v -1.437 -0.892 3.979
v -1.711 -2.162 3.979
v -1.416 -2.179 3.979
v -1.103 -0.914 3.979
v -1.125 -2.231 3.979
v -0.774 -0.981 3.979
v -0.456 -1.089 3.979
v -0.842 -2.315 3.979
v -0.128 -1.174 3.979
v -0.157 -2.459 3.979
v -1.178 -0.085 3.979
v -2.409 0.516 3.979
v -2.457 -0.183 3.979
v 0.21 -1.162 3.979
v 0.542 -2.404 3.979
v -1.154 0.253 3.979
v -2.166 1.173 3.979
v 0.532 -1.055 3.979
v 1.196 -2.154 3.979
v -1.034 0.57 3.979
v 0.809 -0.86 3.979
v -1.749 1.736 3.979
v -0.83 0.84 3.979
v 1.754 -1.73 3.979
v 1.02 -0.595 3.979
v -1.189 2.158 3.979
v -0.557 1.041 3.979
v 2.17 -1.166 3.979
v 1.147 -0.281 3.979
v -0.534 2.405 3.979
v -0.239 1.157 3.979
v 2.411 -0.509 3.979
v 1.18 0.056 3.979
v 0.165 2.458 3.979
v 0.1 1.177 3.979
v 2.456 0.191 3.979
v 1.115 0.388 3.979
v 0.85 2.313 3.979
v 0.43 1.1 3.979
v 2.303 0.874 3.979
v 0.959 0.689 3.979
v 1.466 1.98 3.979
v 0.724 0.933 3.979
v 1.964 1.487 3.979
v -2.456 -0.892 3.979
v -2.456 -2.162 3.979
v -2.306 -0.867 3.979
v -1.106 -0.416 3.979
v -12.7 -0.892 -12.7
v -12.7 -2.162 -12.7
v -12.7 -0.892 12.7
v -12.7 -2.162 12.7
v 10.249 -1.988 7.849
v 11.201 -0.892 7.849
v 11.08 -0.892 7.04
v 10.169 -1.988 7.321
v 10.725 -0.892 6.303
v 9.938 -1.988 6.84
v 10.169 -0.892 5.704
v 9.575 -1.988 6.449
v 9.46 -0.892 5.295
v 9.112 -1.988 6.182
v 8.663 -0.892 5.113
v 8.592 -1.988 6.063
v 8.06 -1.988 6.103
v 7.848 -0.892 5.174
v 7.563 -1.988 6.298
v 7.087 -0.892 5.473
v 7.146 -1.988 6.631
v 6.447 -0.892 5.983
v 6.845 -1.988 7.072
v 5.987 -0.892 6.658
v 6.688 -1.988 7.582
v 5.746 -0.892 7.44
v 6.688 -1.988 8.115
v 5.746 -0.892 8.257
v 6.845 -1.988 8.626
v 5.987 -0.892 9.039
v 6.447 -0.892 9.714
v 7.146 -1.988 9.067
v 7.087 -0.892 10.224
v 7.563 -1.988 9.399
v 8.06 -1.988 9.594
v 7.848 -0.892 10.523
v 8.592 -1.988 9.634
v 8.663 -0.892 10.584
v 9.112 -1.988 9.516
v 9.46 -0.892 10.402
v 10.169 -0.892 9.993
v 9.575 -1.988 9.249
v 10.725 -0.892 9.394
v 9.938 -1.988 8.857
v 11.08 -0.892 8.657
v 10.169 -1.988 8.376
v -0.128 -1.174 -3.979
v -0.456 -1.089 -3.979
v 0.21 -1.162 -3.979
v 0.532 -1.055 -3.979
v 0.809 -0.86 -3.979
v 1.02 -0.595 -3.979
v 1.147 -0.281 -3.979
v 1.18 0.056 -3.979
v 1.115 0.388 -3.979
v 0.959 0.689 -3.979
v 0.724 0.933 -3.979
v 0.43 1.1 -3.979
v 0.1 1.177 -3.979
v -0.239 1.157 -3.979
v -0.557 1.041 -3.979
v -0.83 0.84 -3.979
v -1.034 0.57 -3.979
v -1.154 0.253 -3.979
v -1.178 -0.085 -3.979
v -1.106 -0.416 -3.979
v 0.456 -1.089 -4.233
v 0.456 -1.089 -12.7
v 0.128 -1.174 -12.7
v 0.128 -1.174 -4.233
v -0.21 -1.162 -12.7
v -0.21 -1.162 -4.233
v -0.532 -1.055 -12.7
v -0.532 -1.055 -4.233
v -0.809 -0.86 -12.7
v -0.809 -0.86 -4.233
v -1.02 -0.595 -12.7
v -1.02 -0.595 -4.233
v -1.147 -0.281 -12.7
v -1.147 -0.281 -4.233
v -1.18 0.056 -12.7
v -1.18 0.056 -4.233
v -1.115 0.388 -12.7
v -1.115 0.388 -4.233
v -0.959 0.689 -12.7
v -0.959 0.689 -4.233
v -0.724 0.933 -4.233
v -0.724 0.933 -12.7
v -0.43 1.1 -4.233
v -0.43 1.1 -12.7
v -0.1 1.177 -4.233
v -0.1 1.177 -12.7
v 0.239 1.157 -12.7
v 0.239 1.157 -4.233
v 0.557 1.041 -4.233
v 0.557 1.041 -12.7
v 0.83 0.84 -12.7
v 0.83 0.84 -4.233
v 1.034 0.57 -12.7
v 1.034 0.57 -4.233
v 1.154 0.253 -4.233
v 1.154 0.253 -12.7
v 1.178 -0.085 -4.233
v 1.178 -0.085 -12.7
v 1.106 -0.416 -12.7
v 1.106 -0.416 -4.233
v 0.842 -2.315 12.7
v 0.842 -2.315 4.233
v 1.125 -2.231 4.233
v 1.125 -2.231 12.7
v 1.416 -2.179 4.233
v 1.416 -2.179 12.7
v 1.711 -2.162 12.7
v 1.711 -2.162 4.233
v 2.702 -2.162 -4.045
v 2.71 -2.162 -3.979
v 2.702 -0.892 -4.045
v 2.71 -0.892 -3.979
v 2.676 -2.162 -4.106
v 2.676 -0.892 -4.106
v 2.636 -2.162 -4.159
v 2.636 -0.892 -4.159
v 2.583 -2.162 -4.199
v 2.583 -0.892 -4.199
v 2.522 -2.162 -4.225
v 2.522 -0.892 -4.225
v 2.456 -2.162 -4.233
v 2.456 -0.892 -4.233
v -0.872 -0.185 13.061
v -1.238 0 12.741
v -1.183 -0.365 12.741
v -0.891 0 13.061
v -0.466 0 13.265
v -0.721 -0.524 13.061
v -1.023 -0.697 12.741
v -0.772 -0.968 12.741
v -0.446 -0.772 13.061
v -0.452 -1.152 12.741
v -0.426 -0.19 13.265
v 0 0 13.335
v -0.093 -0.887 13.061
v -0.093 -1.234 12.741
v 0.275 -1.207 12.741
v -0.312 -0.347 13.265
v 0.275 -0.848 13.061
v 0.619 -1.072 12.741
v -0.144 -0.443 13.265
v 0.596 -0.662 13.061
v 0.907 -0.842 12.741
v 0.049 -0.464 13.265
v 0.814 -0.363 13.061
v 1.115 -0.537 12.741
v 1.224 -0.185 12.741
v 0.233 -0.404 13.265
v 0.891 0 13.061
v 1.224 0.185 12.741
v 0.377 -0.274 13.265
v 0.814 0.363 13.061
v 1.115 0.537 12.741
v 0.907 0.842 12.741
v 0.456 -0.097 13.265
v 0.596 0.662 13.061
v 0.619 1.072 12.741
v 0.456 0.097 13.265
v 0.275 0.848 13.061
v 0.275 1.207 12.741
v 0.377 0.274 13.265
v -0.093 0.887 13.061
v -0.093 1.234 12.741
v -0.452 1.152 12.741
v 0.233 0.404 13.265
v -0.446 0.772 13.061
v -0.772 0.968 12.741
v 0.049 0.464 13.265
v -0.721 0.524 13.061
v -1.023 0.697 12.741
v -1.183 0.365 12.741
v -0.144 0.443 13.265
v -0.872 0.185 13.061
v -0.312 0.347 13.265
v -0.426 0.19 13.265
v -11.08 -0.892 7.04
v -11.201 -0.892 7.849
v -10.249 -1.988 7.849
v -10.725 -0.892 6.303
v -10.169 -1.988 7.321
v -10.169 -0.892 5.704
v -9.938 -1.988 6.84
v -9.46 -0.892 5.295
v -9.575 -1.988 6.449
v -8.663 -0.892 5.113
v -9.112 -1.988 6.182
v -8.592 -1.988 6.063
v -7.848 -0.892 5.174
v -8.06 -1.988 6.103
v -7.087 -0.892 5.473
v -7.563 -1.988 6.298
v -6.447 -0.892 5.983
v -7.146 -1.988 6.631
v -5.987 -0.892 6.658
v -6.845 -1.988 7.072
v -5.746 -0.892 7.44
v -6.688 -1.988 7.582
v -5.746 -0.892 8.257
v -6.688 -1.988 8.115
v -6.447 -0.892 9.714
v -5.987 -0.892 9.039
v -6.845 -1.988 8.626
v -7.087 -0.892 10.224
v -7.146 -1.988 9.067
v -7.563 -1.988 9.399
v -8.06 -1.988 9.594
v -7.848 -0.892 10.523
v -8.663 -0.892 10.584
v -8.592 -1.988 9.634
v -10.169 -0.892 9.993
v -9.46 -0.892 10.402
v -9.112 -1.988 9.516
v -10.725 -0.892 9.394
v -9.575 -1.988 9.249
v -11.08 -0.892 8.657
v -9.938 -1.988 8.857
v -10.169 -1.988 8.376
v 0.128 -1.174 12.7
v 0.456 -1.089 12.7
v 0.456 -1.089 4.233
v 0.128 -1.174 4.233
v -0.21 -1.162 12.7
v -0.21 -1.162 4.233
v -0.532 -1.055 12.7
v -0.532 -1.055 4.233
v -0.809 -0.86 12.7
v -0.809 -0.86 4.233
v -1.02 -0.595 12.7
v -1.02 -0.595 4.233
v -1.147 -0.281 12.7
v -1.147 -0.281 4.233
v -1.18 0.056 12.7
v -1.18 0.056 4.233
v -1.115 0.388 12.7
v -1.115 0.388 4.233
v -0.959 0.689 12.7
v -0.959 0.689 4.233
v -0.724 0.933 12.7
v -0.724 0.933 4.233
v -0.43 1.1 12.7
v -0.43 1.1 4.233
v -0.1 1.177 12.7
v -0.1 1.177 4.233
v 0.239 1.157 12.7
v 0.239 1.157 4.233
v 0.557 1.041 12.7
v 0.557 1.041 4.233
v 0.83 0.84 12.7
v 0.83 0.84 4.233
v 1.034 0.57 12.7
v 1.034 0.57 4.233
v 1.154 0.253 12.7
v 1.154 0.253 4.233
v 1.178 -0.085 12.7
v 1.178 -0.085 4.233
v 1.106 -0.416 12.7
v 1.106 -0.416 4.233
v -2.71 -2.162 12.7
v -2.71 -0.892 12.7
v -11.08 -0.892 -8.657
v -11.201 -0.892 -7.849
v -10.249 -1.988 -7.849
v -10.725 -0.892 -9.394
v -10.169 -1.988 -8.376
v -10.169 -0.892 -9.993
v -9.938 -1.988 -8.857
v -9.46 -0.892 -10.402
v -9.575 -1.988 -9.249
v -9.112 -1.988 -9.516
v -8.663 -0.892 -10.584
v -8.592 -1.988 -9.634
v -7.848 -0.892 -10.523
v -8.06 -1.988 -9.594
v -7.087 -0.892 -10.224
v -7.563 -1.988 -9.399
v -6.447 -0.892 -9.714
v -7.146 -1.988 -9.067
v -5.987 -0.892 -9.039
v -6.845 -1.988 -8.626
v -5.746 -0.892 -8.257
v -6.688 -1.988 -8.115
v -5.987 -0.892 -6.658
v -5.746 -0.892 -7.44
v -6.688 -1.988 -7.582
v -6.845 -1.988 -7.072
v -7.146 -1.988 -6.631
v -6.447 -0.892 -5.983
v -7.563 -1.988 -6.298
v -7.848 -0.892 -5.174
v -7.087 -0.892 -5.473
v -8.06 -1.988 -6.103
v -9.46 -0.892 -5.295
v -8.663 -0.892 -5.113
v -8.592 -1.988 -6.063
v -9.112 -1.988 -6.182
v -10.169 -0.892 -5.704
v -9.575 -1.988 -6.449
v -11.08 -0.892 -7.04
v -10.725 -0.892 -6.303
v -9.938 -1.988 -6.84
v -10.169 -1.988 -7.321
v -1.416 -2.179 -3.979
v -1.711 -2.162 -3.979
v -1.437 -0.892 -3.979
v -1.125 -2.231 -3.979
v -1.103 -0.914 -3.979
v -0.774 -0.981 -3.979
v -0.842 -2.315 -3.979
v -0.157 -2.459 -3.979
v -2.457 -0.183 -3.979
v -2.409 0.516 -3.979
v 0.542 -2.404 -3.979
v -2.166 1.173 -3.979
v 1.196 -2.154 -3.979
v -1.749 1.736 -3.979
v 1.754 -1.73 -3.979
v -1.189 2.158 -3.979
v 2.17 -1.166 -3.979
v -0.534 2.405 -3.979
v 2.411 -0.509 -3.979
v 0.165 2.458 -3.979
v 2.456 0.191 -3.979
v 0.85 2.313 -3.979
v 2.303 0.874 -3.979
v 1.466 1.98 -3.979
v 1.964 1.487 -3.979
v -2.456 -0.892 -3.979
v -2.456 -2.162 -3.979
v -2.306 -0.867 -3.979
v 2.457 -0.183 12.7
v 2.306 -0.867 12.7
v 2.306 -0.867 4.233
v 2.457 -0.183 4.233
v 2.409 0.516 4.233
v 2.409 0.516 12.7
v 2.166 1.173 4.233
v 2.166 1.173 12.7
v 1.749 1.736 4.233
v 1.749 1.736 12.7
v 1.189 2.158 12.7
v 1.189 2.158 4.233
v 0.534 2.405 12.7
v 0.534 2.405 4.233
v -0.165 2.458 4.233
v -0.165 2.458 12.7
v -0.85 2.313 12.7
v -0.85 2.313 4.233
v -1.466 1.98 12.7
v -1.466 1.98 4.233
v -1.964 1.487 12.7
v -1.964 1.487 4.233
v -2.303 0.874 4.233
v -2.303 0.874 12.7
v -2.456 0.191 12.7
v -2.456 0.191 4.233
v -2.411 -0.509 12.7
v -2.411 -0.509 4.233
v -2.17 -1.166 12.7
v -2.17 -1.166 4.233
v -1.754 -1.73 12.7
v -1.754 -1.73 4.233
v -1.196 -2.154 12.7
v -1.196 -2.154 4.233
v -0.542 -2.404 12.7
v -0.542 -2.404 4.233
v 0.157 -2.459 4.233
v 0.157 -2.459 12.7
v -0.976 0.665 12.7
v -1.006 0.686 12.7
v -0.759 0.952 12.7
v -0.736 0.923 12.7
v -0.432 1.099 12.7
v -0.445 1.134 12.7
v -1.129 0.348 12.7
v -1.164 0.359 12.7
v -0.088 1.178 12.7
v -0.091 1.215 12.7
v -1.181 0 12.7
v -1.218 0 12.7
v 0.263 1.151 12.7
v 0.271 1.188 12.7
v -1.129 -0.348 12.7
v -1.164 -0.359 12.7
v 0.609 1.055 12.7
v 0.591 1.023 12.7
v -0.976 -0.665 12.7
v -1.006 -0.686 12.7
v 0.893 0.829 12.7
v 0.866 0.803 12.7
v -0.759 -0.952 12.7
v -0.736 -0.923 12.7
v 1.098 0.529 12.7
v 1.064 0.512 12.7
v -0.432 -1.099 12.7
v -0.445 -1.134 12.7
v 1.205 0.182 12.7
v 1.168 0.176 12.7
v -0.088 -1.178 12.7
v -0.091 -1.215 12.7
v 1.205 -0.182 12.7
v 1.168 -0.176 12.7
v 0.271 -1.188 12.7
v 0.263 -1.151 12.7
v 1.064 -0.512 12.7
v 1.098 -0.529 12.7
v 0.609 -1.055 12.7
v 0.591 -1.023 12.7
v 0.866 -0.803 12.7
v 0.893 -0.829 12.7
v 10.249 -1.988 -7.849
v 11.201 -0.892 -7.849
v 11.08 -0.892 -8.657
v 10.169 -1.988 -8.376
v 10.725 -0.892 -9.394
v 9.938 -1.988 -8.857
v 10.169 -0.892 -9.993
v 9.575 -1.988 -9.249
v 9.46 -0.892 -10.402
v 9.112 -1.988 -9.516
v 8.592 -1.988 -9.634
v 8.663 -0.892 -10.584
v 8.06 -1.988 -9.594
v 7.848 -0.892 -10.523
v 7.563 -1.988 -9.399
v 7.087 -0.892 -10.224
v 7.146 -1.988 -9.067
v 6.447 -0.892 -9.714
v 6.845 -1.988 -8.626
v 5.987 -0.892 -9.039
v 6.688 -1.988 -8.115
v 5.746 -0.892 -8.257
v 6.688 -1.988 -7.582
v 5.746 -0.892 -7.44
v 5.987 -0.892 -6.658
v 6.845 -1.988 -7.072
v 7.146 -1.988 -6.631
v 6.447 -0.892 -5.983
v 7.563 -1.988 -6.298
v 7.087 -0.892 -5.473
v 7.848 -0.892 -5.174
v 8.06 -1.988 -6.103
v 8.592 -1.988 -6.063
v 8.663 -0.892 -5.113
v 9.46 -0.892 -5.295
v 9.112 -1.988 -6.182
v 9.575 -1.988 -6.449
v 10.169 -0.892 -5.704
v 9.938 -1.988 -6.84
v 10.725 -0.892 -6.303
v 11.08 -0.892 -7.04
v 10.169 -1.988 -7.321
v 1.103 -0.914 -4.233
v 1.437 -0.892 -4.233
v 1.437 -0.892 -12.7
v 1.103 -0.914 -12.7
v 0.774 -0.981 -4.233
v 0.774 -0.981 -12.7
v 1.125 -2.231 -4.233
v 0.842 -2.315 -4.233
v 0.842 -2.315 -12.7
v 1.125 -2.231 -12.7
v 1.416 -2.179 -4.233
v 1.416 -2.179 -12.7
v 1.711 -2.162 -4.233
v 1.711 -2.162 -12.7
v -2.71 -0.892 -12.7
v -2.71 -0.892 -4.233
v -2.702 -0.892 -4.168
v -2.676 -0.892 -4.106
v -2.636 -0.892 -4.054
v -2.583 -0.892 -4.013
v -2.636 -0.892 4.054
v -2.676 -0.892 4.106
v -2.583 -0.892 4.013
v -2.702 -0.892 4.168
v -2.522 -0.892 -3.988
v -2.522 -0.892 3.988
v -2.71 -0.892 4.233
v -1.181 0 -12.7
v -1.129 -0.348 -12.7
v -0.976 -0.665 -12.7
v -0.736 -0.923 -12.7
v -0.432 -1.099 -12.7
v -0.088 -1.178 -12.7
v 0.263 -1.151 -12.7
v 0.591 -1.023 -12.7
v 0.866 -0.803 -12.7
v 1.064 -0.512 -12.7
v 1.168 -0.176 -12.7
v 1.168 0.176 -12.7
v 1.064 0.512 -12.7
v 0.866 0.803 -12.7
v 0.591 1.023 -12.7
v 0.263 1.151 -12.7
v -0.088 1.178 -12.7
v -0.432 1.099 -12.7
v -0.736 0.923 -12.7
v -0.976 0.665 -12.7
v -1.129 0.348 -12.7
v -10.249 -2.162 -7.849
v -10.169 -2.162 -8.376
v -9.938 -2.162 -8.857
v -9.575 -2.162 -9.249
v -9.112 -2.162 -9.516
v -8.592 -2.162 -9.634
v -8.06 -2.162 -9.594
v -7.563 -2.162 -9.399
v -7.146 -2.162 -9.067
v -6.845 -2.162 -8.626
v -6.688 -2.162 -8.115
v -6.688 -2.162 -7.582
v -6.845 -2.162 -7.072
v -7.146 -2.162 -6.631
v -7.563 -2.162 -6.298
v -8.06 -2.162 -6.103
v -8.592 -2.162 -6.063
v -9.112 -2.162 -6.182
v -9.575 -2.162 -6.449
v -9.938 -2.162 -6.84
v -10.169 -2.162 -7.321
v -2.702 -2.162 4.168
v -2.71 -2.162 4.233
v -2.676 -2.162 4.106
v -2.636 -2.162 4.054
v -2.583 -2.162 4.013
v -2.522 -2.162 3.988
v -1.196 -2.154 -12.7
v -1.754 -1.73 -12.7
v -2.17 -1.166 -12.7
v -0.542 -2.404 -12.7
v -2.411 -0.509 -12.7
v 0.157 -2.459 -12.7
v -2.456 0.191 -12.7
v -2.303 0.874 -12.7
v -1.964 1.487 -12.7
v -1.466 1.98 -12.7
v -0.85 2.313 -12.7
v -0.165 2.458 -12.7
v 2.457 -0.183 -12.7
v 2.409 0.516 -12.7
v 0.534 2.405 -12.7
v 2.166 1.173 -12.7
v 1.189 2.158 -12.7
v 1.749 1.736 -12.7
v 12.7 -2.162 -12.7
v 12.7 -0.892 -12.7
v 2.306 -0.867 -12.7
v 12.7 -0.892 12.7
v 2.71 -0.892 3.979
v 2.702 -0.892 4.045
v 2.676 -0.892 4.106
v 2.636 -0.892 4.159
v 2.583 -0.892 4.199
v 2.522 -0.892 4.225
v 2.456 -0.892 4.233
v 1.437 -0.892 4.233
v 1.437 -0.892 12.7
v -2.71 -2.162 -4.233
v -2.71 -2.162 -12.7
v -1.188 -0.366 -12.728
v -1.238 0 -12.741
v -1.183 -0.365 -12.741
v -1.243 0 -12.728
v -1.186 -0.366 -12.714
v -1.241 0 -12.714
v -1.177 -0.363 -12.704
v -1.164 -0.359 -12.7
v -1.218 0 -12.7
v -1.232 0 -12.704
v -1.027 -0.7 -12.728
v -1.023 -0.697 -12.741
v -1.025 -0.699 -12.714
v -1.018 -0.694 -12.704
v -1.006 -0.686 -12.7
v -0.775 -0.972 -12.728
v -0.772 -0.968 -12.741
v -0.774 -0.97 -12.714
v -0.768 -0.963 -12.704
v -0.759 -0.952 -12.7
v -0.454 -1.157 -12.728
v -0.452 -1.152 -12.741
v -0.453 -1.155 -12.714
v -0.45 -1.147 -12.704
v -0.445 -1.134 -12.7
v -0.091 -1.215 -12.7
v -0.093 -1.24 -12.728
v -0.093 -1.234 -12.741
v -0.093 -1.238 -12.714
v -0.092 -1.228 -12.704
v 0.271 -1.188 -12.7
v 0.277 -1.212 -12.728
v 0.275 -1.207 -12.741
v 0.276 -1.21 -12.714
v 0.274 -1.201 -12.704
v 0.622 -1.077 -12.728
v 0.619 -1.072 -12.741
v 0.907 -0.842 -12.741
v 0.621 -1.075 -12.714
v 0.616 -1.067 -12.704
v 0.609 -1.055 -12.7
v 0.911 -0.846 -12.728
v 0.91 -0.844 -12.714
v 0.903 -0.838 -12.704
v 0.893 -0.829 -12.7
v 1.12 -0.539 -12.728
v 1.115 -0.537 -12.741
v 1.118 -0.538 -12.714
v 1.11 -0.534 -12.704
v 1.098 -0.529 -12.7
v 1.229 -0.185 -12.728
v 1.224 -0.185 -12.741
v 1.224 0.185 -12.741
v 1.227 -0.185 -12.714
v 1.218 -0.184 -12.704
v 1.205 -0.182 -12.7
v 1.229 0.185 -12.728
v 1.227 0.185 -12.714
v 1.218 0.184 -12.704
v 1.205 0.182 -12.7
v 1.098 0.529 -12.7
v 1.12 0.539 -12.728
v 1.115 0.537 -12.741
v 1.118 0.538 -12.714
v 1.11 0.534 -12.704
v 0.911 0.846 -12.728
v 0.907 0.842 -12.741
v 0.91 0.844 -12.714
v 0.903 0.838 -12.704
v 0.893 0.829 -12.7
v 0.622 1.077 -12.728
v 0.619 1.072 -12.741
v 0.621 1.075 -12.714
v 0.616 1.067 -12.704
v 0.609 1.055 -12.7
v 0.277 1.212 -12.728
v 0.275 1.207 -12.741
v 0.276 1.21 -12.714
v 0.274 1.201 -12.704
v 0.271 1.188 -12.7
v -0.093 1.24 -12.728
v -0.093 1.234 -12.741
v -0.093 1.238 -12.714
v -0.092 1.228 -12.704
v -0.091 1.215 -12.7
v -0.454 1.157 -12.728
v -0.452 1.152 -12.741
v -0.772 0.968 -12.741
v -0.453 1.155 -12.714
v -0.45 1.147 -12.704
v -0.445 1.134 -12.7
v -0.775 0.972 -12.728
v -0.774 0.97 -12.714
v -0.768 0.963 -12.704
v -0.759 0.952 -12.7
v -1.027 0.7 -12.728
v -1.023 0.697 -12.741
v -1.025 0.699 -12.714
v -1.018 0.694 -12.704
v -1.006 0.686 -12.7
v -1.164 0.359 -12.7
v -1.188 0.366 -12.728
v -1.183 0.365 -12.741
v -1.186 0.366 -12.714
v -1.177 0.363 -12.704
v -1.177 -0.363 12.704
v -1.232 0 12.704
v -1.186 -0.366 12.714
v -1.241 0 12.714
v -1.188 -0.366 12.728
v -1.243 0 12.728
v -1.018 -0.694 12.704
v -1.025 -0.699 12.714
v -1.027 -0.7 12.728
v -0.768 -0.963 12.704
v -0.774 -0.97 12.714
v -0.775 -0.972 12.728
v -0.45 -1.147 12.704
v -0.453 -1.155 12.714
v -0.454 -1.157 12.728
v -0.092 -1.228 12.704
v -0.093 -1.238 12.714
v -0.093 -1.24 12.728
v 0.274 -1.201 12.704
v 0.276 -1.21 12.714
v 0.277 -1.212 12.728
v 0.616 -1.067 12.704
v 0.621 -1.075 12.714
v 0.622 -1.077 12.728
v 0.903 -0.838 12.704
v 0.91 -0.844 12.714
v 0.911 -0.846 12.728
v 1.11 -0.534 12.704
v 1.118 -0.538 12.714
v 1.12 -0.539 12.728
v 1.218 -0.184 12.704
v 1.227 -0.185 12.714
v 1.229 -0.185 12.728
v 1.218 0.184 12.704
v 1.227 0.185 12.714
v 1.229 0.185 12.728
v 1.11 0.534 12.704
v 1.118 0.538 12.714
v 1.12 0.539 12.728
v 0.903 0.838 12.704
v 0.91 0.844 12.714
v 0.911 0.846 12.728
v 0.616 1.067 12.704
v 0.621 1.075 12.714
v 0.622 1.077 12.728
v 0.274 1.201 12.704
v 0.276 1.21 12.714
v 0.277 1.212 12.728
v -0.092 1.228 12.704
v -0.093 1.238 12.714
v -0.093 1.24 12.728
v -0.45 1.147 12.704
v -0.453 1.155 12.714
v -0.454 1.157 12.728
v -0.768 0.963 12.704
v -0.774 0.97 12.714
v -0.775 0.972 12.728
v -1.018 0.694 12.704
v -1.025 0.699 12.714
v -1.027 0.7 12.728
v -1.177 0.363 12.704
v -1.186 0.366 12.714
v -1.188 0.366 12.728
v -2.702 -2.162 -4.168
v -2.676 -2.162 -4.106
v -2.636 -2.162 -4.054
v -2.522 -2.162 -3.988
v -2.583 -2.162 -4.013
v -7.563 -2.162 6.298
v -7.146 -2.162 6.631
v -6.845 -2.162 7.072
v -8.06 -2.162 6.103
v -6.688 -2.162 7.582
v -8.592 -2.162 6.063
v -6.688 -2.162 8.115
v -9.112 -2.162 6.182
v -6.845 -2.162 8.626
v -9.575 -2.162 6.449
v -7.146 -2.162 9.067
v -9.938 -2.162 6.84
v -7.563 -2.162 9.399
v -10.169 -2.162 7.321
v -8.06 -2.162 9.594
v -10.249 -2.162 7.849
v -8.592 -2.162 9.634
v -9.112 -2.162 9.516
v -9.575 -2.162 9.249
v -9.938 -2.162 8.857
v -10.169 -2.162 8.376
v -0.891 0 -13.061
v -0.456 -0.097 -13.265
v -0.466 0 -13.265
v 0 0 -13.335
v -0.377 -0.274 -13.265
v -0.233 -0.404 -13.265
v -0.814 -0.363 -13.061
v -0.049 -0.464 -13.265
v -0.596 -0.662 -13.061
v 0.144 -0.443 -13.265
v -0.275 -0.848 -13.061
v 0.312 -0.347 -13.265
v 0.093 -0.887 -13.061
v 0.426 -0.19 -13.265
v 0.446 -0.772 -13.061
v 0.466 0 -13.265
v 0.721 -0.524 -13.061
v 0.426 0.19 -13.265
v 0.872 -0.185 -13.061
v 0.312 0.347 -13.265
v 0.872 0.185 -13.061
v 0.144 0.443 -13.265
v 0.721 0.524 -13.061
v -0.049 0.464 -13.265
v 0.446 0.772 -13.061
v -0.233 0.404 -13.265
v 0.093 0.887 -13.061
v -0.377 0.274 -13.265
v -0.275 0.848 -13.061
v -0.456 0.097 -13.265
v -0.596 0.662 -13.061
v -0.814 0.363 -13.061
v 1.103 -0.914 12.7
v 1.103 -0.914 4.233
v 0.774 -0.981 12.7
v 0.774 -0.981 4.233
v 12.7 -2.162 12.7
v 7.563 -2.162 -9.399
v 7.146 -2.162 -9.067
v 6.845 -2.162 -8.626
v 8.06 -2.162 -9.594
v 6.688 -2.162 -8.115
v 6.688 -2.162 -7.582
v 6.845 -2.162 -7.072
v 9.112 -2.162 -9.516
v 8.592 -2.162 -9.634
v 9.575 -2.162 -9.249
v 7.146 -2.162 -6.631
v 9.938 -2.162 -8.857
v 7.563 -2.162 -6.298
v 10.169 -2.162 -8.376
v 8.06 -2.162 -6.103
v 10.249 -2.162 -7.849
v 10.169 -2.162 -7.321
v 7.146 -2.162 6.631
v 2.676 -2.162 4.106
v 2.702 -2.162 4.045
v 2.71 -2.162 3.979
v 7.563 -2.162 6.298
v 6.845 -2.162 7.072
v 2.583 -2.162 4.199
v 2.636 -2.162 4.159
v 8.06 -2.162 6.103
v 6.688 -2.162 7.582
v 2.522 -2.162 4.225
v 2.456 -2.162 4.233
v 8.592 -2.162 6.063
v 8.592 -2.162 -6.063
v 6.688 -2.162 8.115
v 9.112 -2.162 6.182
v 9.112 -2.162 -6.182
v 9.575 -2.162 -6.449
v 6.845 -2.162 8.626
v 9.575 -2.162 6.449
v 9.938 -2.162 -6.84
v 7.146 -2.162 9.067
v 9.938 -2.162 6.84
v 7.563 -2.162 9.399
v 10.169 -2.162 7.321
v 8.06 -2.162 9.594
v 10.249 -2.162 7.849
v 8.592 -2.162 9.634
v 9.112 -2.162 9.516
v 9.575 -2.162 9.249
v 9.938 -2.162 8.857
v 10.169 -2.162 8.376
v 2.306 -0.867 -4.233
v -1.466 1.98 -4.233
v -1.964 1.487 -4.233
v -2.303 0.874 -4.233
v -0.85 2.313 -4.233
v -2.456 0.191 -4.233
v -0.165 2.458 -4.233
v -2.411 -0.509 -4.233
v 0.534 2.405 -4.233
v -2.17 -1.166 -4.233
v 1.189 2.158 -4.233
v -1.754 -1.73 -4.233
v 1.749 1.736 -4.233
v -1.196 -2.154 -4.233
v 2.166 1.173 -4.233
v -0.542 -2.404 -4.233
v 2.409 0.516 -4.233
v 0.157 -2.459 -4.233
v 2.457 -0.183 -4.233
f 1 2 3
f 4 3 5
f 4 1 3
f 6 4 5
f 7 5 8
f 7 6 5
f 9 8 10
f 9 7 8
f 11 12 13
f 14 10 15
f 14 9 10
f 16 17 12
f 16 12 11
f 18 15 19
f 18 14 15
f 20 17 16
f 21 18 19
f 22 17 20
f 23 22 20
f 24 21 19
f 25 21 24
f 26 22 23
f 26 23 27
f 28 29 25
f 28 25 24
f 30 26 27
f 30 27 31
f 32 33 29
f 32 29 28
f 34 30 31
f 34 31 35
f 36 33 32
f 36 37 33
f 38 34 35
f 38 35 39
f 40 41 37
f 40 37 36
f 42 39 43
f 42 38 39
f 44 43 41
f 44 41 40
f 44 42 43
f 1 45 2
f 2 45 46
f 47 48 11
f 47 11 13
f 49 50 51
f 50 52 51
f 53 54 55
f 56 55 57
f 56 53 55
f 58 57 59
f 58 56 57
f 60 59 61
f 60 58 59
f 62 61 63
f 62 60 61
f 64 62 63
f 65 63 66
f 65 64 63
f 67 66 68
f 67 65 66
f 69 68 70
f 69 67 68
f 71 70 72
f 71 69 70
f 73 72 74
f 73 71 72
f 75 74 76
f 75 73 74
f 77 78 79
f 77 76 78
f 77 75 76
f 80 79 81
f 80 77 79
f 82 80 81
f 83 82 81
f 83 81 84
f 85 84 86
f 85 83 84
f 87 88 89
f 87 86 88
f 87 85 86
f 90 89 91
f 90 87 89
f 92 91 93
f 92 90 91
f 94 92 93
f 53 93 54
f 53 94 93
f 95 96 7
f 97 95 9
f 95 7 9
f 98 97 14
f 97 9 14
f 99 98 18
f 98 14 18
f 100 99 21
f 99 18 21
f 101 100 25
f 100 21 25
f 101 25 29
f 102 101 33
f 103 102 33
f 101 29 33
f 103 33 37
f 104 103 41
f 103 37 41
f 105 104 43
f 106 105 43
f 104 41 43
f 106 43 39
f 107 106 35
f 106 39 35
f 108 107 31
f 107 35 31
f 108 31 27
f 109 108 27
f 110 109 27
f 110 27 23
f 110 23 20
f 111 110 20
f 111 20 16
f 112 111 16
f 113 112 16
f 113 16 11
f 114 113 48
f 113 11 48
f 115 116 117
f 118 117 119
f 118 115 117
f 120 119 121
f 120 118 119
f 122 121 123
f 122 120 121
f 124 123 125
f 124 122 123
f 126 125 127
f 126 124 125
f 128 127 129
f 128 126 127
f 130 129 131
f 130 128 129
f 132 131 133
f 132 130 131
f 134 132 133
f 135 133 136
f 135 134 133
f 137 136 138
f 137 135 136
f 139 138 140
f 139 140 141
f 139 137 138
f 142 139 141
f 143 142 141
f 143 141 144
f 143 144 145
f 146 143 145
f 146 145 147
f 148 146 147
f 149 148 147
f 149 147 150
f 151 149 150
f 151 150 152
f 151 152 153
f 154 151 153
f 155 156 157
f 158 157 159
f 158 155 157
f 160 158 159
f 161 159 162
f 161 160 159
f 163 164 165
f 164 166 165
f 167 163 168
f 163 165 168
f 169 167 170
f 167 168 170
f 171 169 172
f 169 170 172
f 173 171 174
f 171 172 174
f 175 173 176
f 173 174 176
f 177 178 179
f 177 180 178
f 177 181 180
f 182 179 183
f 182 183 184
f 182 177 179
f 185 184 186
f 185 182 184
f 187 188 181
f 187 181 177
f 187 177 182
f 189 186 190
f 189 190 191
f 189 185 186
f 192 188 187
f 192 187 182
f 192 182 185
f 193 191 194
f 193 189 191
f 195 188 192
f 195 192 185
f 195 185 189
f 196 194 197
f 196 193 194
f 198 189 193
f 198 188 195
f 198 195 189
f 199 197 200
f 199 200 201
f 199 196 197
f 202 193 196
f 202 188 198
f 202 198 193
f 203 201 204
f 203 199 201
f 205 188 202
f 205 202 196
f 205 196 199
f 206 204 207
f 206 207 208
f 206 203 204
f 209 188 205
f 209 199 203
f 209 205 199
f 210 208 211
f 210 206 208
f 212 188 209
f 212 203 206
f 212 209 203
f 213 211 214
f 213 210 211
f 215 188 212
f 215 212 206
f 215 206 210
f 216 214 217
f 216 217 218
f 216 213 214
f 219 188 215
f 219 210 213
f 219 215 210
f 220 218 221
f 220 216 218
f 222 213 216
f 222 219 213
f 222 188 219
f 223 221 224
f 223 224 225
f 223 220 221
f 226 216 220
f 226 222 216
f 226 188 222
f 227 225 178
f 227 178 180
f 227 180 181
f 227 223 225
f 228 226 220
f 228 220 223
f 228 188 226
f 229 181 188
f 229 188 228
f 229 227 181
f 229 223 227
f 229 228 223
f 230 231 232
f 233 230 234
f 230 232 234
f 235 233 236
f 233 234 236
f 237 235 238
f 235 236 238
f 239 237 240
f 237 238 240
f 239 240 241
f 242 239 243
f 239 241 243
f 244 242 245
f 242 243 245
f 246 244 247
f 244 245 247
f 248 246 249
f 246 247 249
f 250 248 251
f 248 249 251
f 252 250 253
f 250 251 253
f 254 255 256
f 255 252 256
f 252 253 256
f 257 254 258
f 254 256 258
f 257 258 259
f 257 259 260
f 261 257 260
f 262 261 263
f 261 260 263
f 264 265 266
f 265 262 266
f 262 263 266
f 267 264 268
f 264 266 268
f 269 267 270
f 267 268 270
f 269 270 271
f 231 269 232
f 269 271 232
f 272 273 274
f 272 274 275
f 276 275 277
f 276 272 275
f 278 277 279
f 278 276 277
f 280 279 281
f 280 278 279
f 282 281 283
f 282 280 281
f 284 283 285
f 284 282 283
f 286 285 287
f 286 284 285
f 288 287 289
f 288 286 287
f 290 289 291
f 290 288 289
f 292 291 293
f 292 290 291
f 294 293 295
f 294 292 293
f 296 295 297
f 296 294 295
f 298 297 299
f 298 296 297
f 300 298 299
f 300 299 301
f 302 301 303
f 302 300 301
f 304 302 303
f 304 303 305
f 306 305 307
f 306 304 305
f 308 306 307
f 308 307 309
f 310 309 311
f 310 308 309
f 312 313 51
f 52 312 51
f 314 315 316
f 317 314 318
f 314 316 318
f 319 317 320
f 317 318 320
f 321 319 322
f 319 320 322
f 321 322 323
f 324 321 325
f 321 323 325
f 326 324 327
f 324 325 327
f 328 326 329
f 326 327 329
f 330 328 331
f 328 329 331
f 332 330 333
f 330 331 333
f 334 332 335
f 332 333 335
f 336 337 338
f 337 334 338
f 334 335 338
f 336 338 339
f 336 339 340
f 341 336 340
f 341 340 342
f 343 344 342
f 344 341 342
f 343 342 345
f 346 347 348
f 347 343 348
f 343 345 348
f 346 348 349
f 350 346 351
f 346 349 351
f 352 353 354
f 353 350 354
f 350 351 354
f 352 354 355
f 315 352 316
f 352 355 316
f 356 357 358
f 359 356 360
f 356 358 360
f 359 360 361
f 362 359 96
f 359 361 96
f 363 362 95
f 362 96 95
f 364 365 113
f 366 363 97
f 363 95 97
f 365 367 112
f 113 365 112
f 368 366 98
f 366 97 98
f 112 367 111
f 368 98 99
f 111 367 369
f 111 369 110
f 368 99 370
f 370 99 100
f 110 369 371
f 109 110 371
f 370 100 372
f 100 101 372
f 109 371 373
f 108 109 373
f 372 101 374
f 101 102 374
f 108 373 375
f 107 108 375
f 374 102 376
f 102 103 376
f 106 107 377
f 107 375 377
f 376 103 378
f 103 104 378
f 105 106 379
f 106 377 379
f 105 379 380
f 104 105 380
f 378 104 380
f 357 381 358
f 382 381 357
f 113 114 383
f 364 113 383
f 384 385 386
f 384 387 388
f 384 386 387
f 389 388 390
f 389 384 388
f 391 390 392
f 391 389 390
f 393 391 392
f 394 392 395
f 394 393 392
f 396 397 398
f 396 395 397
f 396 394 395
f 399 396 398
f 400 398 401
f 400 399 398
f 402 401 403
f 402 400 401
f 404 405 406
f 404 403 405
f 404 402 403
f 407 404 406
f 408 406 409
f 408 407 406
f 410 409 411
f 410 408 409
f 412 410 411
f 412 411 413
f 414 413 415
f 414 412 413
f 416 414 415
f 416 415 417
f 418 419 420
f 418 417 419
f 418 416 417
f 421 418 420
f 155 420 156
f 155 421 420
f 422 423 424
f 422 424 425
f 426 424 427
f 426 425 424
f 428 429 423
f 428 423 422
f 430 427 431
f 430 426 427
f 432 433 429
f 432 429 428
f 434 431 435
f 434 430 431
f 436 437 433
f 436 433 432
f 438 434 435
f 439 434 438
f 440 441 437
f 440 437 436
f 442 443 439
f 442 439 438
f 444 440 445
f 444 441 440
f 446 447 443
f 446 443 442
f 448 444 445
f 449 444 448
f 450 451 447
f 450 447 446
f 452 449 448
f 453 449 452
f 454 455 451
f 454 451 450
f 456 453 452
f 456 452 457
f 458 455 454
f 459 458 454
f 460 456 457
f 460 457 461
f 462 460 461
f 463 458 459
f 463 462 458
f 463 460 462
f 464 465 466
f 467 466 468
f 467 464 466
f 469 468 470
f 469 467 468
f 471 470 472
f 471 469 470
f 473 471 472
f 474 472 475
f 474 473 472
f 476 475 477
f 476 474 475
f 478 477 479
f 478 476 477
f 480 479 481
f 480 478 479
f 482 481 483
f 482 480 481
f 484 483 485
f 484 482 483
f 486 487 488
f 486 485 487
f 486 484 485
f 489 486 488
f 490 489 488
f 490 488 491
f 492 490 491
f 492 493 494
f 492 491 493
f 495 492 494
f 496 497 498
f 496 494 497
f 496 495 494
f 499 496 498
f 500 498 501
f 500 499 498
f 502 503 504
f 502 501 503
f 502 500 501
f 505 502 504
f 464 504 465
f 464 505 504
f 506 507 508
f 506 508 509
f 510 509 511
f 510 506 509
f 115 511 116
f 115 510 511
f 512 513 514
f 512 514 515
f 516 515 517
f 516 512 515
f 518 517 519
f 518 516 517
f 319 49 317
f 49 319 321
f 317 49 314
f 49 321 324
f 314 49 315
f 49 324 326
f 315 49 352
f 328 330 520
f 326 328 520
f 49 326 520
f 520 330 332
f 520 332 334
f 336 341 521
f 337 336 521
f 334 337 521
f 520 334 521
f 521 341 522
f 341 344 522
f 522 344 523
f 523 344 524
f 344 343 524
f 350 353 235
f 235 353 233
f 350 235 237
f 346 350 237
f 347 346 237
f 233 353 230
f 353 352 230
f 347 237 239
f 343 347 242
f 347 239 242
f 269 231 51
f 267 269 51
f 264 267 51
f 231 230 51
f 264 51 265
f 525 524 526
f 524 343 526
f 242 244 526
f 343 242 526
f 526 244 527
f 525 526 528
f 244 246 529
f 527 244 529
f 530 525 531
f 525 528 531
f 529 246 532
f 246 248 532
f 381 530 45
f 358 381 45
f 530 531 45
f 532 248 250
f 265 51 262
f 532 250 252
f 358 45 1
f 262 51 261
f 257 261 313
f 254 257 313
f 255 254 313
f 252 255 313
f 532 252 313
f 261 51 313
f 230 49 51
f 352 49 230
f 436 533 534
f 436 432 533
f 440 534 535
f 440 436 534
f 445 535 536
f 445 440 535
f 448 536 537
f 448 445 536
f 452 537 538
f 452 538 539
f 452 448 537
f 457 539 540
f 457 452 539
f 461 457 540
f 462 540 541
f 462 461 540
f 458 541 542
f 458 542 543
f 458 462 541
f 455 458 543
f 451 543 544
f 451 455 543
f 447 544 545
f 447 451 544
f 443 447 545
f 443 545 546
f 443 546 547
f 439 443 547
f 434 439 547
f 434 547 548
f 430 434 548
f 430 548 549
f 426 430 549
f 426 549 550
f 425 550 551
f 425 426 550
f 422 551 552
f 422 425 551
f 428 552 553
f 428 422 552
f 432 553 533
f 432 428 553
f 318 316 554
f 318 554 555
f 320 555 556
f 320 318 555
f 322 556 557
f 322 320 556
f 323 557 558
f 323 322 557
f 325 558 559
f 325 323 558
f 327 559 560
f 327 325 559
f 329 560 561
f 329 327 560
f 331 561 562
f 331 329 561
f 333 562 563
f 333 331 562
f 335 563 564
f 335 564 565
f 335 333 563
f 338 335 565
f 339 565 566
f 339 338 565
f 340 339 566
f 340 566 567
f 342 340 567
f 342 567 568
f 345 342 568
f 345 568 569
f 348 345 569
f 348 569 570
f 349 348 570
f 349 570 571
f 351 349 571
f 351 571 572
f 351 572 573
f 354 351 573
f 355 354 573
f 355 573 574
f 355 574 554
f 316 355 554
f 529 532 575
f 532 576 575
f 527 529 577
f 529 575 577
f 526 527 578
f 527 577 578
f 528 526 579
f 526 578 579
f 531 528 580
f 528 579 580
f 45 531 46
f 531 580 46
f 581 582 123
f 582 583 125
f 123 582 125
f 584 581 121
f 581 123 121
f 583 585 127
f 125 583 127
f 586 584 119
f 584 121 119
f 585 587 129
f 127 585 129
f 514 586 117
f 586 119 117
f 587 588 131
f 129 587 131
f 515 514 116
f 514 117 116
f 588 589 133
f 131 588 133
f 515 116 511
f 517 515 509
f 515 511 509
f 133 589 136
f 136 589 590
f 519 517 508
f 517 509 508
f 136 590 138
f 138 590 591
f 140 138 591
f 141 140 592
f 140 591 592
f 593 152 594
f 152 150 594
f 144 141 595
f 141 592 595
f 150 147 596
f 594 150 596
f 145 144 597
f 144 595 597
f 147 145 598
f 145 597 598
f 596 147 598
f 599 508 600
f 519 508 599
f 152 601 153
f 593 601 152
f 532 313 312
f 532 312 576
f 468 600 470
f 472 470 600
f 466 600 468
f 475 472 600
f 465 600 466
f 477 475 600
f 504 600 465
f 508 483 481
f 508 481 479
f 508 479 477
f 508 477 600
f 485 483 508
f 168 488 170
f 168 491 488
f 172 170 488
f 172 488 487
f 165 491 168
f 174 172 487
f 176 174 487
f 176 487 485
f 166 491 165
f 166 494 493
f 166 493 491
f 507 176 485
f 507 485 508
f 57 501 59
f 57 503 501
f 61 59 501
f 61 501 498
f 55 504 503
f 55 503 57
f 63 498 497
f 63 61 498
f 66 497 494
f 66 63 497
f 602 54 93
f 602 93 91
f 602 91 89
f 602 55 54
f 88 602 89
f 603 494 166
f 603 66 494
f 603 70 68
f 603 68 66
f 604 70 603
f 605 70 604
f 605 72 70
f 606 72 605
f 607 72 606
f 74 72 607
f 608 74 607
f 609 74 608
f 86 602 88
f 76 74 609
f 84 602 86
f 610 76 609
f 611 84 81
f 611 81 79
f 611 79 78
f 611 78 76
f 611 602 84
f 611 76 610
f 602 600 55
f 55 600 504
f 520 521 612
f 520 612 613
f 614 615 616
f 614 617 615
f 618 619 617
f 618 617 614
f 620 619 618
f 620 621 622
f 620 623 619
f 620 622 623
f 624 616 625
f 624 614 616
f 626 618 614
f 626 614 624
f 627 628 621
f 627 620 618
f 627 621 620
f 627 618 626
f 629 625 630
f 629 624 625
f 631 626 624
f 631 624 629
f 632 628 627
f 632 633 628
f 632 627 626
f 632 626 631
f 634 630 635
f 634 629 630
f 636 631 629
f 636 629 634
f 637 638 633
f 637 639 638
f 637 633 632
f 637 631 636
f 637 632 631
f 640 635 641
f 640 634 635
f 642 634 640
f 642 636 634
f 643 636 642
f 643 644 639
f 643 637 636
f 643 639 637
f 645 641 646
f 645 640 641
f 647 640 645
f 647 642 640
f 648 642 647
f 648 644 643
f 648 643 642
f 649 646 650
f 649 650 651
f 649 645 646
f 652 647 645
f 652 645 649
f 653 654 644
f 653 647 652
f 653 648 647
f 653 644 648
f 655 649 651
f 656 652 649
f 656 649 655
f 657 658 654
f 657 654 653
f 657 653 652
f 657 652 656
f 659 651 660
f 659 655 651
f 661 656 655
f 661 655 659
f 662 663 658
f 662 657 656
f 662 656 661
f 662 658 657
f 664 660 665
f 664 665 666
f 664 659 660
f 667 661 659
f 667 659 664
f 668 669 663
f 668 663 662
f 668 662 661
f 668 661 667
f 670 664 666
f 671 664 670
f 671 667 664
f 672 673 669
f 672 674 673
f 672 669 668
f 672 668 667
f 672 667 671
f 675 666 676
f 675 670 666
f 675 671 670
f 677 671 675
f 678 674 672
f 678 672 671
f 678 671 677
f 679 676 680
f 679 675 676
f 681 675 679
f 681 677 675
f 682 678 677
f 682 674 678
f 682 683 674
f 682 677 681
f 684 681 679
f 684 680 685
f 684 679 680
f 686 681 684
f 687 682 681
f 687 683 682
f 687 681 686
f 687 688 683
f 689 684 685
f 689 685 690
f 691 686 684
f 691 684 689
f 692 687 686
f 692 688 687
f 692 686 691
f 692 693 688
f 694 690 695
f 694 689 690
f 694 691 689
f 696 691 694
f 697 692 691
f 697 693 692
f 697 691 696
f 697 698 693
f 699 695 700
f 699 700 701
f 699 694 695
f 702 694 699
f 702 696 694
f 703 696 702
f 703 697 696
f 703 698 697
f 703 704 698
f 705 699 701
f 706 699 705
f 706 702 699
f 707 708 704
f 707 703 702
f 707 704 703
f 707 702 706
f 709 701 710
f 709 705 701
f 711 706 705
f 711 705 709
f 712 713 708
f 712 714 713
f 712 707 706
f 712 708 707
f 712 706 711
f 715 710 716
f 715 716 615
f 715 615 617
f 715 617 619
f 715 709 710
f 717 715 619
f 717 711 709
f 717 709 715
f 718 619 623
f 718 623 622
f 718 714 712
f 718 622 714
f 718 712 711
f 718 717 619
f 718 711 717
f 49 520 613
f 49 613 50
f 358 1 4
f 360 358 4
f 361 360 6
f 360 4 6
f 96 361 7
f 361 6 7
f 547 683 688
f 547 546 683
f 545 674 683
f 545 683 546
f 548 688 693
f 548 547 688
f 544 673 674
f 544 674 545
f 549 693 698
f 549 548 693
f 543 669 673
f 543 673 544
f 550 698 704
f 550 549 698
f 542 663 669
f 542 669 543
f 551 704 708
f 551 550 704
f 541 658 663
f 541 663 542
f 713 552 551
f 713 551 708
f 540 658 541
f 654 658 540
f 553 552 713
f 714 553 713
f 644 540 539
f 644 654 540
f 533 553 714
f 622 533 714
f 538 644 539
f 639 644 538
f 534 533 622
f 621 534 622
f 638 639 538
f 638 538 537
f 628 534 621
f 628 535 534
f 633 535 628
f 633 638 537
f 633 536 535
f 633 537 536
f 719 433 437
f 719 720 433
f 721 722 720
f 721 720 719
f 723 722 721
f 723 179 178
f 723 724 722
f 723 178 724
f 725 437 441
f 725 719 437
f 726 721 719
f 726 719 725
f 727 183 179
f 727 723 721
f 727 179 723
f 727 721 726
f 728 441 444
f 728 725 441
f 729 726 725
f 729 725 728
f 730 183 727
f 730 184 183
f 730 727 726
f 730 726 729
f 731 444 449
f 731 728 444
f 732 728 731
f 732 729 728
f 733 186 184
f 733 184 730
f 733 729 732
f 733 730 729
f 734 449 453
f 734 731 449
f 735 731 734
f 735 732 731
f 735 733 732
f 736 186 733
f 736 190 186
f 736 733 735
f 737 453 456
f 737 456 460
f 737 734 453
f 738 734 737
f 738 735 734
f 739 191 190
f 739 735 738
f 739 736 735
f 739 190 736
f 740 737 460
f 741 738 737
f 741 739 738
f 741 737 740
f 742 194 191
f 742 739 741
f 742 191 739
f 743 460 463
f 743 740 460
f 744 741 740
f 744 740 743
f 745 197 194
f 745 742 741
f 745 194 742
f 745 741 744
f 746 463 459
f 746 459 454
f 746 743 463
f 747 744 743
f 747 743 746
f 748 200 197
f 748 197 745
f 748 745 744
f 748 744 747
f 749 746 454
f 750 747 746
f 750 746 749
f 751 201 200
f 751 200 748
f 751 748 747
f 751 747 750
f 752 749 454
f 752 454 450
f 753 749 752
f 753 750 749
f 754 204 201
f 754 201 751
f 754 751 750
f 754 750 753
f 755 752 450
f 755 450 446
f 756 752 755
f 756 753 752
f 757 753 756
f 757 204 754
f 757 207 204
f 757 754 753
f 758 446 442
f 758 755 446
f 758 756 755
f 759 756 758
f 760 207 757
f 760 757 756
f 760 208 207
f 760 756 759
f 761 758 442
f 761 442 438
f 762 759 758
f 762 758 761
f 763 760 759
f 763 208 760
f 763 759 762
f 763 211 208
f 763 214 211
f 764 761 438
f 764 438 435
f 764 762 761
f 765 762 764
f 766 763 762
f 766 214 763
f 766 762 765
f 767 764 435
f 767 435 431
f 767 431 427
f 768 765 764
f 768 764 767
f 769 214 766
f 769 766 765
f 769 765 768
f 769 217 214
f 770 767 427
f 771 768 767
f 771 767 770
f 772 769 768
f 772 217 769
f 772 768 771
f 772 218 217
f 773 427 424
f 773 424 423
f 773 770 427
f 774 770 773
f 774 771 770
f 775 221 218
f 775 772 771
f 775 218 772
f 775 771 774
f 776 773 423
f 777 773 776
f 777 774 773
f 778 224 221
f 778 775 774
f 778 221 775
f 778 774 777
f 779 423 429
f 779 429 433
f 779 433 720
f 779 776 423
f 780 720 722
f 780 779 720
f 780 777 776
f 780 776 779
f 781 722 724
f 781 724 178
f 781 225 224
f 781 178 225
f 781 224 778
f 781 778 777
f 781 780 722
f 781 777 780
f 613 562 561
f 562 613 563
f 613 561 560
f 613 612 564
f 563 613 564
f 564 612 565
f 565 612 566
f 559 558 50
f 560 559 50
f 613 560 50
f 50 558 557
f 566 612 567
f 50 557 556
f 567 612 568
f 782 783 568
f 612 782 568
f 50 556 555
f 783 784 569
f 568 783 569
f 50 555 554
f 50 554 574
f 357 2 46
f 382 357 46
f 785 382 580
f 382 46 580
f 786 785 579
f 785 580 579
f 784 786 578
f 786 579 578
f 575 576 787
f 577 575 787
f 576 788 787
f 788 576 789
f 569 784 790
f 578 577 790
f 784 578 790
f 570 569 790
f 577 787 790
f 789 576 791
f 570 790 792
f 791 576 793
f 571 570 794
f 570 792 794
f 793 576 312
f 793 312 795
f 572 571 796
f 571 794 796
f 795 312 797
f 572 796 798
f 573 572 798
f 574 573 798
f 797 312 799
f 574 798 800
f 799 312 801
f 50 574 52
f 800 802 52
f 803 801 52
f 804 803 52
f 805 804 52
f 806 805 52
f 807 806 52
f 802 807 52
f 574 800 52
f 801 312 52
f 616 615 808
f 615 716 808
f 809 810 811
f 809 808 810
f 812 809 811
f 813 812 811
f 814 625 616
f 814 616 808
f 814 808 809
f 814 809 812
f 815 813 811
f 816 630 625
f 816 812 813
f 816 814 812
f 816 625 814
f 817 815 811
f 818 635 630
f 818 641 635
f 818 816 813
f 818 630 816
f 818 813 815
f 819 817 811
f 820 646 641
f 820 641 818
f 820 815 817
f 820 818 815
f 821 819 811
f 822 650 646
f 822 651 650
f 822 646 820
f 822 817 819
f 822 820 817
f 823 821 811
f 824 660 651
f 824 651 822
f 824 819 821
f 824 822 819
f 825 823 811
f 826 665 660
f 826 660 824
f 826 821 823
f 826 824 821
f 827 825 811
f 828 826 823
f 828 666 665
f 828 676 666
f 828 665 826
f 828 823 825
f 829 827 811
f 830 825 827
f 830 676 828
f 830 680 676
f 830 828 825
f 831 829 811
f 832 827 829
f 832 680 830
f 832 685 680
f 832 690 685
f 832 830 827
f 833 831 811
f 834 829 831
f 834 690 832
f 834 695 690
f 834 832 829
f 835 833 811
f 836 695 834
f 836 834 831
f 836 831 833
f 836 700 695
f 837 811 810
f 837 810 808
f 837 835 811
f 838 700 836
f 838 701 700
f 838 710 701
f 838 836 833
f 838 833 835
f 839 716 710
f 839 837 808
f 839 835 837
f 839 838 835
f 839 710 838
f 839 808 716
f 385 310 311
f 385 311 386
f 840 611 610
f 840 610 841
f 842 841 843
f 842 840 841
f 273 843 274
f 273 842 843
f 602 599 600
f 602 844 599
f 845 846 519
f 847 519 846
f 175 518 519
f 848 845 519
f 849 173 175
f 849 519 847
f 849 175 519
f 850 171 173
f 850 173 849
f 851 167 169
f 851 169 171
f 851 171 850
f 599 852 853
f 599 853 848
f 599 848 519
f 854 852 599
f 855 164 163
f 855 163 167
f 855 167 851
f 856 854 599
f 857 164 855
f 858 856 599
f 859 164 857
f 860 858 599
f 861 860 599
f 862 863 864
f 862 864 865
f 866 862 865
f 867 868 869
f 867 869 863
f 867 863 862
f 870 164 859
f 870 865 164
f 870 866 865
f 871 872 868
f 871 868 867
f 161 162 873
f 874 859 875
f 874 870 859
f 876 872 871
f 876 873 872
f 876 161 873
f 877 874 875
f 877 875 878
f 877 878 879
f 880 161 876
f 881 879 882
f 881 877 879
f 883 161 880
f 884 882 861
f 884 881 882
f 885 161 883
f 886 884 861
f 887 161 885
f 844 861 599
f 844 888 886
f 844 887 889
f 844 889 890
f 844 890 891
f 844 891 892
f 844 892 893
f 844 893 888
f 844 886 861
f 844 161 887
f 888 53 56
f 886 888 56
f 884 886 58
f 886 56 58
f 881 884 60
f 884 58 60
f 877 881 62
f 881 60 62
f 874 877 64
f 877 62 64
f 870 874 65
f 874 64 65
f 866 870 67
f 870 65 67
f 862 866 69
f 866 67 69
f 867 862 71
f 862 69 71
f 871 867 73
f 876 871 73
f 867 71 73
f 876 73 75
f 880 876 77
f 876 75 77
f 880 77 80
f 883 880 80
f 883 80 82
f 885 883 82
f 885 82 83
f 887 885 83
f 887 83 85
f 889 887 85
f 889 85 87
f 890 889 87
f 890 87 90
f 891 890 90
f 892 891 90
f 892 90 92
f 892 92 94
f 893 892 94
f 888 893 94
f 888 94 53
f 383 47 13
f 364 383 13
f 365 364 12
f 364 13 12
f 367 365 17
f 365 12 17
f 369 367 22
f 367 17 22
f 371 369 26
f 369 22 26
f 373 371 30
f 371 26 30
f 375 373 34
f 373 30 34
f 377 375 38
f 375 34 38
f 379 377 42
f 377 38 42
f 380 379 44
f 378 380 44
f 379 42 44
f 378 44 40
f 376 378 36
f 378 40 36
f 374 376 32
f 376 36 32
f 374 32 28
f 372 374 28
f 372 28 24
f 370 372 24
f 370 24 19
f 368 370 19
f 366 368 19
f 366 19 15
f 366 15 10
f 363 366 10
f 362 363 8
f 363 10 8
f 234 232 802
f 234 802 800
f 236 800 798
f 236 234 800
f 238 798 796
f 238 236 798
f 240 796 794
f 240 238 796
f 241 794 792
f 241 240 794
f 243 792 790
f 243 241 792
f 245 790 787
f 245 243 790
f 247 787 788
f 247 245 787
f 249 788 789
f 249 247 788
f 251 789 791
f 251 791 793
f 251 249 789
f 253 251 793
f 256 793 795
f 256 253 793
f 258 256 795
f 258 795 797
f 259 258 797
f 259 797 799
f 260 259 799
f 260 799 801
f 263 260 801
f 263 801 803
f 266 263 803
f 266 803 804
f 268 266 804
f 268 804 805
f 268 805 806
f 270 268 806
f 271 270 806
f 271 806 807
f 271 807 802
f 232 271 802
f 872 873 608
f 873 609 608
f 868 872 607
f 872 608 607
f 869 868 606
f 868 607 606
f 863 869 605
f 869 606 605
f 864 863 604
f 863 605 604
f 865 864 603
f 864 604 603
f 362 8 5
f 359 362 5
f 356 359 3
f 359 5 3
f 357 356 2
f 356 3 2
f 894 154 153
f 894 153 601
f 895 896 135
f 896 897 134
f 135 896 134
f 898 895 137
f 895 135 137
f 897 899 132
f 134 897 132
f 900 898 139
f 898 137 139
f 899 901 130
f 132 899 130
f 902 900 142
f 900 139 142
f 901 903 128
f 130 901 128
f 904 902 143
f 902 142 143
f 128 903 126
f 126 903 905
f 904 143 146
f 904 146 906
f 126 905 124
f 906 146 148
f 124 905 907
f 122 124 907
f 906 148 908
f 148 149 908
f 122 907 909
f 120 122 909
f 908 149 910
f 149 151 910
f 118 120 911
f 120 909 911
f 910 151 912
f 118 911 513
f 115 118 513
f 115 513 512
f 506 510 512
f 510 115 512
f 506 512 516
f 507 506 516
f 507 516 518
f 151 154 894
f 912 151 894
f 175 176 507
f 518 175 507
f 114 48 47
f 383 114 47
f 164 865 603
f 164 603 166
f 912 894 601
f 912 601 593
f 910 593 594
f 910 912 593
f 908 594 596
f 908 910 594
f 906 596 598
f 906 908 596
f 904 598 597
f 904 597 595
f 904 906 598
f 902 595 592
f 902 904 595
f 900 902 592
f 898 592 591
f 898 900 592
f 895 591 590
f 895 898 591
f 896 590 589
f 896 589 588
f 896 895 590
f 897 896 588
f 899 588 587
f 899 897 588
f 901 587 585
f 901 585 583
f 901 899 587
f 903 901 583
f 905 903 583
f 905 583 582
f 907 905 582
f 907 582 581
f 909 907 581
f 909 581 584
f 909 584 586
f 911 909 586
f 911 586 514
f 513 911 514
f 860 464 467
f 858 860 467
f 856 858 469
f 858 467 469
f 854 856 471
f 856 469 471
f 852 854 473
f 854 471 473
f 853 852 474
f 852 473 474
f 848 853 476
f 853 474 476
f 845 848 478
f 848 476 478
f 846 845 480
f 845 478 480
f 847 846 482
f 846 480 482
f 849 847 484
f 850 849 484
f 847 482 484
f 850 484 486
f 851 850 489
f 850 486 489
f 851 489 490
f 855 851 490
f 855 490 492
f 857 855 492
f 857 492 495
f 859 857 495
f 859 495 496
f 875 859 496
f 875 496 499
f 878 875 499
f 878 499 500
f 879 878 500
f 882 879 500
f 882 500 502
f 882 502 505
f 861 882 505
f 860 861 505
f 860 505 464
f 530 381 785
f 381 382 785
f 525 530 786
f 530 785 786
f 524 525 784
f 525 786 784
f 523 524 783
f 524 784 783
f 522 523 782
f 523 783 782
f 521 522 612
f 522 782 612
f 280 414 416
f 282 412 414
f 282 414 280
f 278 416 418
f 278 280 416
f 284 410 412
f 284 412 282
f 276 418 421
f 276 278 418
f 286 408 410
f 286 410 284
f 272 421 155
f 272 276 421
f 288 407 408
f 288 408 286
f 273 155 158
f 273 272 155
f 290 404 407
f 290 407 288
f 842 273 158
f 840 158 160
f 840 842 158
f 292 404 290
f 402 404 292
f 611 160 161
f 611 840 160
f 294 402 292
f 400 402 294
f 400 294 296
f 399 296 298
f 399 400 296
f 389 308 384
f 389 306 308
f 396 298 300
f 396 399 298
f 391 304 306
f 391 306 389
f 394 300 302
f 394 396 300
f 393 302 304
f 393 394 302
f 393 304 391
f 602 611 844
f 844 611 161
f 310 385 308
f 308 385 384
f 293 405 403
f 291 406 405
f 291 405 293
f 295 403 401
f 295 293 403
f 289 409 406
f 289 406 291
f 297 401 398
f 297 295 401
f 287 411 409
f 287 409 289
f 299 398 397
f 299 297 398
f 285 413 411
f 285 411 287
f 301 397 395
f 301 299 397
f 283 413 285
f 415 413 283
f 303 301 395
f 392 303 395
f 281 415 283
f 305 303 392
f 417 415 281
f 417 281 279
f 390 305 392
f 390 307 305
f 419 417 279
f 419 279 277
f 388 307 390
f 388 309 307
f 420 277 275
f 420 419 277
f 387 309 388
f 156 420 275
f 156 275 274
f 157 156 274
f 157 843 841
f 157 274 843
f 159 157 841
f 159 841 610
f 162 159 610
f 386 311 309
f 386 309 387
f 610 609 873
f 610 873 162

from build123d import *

# Parameters (mm, degrees)
BOSS_EXTRUDE1_DEPTH      = 12.7
BOSS_EXTRUDE1_DEPTH_BACK = 12.7
SKETCH6_R                = 1.7907
CUT_EXTRUDE1_DEPTH       = 2.54
SKETCH11_R               = 2.7432
CUT_EXTRUDE5_DEPTH       = 2.571552736
CUT_EXTRUDE5_TAPER       = 41
SKETCH8_W                = 5.42036
SKETCH8_H                = 8.466666666
CUT_EXTRUDE2_DEPTH       = 5.626047264
CUT_EXTRUDE2_DEPTH_BACK  = 1.301552736
SKETCH12_W               = 5.42036
SKETCH12_H               = 8.720666667
CUT_EXTRUDE6_DEPTH       = 4.356047264
CUT_EXTRUDE6_DEPTH_BACK  = 2.571552736
FILLET1_R                = 0.254
FILLET2_R                = 0.254


with BuildPart() as part:
    # Sketch4 → Boss-Extrude1 (new body, two sides)
    with BuildSketch(Plane.XY) as boss_extrude1_sk:
        with BuildLine():
            Line((12.7, -2.162247264), (12.7, -0.892247264))
            Line((12.7, -0.892247264), (1.437450496, -0.892247264))
            ThreePointArc((1.437450496, -0.892247264), (0.937045899, -0.942027346), (0.456255618, -1.089416367))
            ThreePointArc((0.456255618, -1.089416367), (-0.850505265, 0.819535237), (1.105583556, -0.415550492))
            Line((1.105583556, -0.415550492), (2.306271073, -0.866847264))
            ThreePointArc((2.306271073, -0.866847264), (-1.732922364, 1.751368185), (0.842380579, -2.315319719))
            ThreePointArc((0.842380579, -2.315319719), (1.269903724, -2.200808082), (1.710814166, -2.162247264))
            Line((1.710814166, -2.162247264), (12.7, -2.162247264))
        make_face()
    extrude(amount=BOSS_EXTRUDE1_DEPTH)
    extrude(boss_extrude1_sk.sketch, amount=-BOSS_EXTRUDE1_DEPTH_BACK)

    # Sketch6 → Cut-Extrude1 (cut)
    with BuildSketch(Plane(origin=(0, -0.892247264, 0), x_dir=(1, 0, 0), z_dir=(0, 1, 0))):
        with Locations((8.4582, -7.8486)):
            Circle(SKETCH6_R)
        with Locations((8.4582, 7.8486)):
            Circle(SKETCH6_R)
    extrude(amount=-CUT_EXTRUDE1_DEPTH, mode=Mode.SUBTRACT)

    # Sketch11 → Cut-Extrude5 (cut, through all)
    with BuildSketch(Plane(origin=(0, -0.892247264, 0), x_dir=(1, 0, 0), z_dir=(0, 1, 0))):
        with Locations((8.4582, 7.8486)):
            Circle(SKETCH11_R)
        with Locations((8.4582, -7.8486)):
            Circle(SKETCH11_R)
    extrude(amount=-CUT_EXTRUDE5_DEPTH, taper=CUT_EXTRUDE5_TAPER, mode=Mode.SUBTRACT)


with BuildPart() as body_2:
    # Sketch5 → Revolve1 (revolve)
    with BuildSketch(Plane(origin=(0, 0, 0), x_dir=(1, 0, 0), z_dir=(0, 1, 0))):
        with BuildLine():
            ThreePointArc((-1.237948381, 12.741300813), (-1.241043616, 12.714416391), (-1.218141207, 12.7))
            Line((-1.218141207, 12.7), (-1.1811, 12.7))
            Line((-1.1811, 12.7), (-1.1811, -12.7))
            Line((-1.1811, -12.7), (-1.218141207, -12.7))
            ThreePointArc((-1.218141207, -12.7), (-1.241043616, -12.714416391), (-1.237948381, -12.741300813))
            ThreePointArc((-1.237948381, -12.741300813), (-0.686475586, -13.178900545), (0, -13.335))
            Line((0, -13.335), (0, 13.335))
            ThreePointArc((0, 13.335), (-0.686475586, 13.178900545), (-1.237948381, 12.741300813))
        make_face()
    revolve(axis=Axis((0, 0, -13.335), (0, 0, 1)))


with BuildPart() as body_3:
    # Mirror1: mirrored copy
    add(part.part.mirror(Plane(origin=(0, 0, 0), x_dir=(0, 0, 1), z_dir=(1, 0, 0))))

    # Sketch12 → Cut-Extrude6 (cut, two sides)
    with BuildSketch(Plane(origin=(0, -0.892247264, 0), x_dir=(1, 0, 0), z_dir=(0, 1, 0))) as cut_extrude6_sk:
        with Locations((0, 8.339666667)):
            Rectangle(SKETCH12_W, SKETCH12_H)
        with Locations((0, -8.339666667)):
            Rectangle(SKETCH12_W, SKETCH12_H)
    extrude(amount=CUT_EXTRUDE6_DEPTH, mode=Mode.SUBTRACT)
    extrude(cut_extrude6_sk.sketch, amount=-CUT_EXTRUDE6_DEPTH_BACK, mode=Mode.SUBTRACT)

    # Fillet1
    fillet1_edges = [body_3.edges().sort_by_distance(p)[0] for p in [
        (-2.71018, -1.527247264, 3.979333333),
        (-2.71018, -1.527247264, -3.979333333),
    ]]
    fillet(fillet1_edges, radius=FILLET1_R)


with BuildPart() as part_1:
    add(part.part)

    # Sketch8 → Cut-Extrude2 (cut, two sides)
    with BuildSketch(Plane(origin=(0, -2.162247264, 0), x_dir=(1, 0, 0), z_dir=(0, 1, 0))) as cut_extrude2_sk:
        Rectangle(SKETCH8_W, SKETCH8_H)
    extrude(amount=CUT_EXTRUDE2_DEPTH, mode=Mode.SUBTRACT)
    extrude(cut_extrude2_sk.sketch, amount=-CUT_EXTRUDE2_DEPTH_BACK, mode=Mode.SUBTRACT)

    # Fillet2
    fillet2_edges = [part_1.edges().sort_by_distance(p)[0] for p in [
        (2.71018, -1.527247264, -4.233333333),
        (2.71018, -1.527247264, 4.233333333),
    ]]
    fillet(fillet2_edges, radius=FILLET2_R)


solid = Compound([body_2.part, body_3.part, part_1.part])
